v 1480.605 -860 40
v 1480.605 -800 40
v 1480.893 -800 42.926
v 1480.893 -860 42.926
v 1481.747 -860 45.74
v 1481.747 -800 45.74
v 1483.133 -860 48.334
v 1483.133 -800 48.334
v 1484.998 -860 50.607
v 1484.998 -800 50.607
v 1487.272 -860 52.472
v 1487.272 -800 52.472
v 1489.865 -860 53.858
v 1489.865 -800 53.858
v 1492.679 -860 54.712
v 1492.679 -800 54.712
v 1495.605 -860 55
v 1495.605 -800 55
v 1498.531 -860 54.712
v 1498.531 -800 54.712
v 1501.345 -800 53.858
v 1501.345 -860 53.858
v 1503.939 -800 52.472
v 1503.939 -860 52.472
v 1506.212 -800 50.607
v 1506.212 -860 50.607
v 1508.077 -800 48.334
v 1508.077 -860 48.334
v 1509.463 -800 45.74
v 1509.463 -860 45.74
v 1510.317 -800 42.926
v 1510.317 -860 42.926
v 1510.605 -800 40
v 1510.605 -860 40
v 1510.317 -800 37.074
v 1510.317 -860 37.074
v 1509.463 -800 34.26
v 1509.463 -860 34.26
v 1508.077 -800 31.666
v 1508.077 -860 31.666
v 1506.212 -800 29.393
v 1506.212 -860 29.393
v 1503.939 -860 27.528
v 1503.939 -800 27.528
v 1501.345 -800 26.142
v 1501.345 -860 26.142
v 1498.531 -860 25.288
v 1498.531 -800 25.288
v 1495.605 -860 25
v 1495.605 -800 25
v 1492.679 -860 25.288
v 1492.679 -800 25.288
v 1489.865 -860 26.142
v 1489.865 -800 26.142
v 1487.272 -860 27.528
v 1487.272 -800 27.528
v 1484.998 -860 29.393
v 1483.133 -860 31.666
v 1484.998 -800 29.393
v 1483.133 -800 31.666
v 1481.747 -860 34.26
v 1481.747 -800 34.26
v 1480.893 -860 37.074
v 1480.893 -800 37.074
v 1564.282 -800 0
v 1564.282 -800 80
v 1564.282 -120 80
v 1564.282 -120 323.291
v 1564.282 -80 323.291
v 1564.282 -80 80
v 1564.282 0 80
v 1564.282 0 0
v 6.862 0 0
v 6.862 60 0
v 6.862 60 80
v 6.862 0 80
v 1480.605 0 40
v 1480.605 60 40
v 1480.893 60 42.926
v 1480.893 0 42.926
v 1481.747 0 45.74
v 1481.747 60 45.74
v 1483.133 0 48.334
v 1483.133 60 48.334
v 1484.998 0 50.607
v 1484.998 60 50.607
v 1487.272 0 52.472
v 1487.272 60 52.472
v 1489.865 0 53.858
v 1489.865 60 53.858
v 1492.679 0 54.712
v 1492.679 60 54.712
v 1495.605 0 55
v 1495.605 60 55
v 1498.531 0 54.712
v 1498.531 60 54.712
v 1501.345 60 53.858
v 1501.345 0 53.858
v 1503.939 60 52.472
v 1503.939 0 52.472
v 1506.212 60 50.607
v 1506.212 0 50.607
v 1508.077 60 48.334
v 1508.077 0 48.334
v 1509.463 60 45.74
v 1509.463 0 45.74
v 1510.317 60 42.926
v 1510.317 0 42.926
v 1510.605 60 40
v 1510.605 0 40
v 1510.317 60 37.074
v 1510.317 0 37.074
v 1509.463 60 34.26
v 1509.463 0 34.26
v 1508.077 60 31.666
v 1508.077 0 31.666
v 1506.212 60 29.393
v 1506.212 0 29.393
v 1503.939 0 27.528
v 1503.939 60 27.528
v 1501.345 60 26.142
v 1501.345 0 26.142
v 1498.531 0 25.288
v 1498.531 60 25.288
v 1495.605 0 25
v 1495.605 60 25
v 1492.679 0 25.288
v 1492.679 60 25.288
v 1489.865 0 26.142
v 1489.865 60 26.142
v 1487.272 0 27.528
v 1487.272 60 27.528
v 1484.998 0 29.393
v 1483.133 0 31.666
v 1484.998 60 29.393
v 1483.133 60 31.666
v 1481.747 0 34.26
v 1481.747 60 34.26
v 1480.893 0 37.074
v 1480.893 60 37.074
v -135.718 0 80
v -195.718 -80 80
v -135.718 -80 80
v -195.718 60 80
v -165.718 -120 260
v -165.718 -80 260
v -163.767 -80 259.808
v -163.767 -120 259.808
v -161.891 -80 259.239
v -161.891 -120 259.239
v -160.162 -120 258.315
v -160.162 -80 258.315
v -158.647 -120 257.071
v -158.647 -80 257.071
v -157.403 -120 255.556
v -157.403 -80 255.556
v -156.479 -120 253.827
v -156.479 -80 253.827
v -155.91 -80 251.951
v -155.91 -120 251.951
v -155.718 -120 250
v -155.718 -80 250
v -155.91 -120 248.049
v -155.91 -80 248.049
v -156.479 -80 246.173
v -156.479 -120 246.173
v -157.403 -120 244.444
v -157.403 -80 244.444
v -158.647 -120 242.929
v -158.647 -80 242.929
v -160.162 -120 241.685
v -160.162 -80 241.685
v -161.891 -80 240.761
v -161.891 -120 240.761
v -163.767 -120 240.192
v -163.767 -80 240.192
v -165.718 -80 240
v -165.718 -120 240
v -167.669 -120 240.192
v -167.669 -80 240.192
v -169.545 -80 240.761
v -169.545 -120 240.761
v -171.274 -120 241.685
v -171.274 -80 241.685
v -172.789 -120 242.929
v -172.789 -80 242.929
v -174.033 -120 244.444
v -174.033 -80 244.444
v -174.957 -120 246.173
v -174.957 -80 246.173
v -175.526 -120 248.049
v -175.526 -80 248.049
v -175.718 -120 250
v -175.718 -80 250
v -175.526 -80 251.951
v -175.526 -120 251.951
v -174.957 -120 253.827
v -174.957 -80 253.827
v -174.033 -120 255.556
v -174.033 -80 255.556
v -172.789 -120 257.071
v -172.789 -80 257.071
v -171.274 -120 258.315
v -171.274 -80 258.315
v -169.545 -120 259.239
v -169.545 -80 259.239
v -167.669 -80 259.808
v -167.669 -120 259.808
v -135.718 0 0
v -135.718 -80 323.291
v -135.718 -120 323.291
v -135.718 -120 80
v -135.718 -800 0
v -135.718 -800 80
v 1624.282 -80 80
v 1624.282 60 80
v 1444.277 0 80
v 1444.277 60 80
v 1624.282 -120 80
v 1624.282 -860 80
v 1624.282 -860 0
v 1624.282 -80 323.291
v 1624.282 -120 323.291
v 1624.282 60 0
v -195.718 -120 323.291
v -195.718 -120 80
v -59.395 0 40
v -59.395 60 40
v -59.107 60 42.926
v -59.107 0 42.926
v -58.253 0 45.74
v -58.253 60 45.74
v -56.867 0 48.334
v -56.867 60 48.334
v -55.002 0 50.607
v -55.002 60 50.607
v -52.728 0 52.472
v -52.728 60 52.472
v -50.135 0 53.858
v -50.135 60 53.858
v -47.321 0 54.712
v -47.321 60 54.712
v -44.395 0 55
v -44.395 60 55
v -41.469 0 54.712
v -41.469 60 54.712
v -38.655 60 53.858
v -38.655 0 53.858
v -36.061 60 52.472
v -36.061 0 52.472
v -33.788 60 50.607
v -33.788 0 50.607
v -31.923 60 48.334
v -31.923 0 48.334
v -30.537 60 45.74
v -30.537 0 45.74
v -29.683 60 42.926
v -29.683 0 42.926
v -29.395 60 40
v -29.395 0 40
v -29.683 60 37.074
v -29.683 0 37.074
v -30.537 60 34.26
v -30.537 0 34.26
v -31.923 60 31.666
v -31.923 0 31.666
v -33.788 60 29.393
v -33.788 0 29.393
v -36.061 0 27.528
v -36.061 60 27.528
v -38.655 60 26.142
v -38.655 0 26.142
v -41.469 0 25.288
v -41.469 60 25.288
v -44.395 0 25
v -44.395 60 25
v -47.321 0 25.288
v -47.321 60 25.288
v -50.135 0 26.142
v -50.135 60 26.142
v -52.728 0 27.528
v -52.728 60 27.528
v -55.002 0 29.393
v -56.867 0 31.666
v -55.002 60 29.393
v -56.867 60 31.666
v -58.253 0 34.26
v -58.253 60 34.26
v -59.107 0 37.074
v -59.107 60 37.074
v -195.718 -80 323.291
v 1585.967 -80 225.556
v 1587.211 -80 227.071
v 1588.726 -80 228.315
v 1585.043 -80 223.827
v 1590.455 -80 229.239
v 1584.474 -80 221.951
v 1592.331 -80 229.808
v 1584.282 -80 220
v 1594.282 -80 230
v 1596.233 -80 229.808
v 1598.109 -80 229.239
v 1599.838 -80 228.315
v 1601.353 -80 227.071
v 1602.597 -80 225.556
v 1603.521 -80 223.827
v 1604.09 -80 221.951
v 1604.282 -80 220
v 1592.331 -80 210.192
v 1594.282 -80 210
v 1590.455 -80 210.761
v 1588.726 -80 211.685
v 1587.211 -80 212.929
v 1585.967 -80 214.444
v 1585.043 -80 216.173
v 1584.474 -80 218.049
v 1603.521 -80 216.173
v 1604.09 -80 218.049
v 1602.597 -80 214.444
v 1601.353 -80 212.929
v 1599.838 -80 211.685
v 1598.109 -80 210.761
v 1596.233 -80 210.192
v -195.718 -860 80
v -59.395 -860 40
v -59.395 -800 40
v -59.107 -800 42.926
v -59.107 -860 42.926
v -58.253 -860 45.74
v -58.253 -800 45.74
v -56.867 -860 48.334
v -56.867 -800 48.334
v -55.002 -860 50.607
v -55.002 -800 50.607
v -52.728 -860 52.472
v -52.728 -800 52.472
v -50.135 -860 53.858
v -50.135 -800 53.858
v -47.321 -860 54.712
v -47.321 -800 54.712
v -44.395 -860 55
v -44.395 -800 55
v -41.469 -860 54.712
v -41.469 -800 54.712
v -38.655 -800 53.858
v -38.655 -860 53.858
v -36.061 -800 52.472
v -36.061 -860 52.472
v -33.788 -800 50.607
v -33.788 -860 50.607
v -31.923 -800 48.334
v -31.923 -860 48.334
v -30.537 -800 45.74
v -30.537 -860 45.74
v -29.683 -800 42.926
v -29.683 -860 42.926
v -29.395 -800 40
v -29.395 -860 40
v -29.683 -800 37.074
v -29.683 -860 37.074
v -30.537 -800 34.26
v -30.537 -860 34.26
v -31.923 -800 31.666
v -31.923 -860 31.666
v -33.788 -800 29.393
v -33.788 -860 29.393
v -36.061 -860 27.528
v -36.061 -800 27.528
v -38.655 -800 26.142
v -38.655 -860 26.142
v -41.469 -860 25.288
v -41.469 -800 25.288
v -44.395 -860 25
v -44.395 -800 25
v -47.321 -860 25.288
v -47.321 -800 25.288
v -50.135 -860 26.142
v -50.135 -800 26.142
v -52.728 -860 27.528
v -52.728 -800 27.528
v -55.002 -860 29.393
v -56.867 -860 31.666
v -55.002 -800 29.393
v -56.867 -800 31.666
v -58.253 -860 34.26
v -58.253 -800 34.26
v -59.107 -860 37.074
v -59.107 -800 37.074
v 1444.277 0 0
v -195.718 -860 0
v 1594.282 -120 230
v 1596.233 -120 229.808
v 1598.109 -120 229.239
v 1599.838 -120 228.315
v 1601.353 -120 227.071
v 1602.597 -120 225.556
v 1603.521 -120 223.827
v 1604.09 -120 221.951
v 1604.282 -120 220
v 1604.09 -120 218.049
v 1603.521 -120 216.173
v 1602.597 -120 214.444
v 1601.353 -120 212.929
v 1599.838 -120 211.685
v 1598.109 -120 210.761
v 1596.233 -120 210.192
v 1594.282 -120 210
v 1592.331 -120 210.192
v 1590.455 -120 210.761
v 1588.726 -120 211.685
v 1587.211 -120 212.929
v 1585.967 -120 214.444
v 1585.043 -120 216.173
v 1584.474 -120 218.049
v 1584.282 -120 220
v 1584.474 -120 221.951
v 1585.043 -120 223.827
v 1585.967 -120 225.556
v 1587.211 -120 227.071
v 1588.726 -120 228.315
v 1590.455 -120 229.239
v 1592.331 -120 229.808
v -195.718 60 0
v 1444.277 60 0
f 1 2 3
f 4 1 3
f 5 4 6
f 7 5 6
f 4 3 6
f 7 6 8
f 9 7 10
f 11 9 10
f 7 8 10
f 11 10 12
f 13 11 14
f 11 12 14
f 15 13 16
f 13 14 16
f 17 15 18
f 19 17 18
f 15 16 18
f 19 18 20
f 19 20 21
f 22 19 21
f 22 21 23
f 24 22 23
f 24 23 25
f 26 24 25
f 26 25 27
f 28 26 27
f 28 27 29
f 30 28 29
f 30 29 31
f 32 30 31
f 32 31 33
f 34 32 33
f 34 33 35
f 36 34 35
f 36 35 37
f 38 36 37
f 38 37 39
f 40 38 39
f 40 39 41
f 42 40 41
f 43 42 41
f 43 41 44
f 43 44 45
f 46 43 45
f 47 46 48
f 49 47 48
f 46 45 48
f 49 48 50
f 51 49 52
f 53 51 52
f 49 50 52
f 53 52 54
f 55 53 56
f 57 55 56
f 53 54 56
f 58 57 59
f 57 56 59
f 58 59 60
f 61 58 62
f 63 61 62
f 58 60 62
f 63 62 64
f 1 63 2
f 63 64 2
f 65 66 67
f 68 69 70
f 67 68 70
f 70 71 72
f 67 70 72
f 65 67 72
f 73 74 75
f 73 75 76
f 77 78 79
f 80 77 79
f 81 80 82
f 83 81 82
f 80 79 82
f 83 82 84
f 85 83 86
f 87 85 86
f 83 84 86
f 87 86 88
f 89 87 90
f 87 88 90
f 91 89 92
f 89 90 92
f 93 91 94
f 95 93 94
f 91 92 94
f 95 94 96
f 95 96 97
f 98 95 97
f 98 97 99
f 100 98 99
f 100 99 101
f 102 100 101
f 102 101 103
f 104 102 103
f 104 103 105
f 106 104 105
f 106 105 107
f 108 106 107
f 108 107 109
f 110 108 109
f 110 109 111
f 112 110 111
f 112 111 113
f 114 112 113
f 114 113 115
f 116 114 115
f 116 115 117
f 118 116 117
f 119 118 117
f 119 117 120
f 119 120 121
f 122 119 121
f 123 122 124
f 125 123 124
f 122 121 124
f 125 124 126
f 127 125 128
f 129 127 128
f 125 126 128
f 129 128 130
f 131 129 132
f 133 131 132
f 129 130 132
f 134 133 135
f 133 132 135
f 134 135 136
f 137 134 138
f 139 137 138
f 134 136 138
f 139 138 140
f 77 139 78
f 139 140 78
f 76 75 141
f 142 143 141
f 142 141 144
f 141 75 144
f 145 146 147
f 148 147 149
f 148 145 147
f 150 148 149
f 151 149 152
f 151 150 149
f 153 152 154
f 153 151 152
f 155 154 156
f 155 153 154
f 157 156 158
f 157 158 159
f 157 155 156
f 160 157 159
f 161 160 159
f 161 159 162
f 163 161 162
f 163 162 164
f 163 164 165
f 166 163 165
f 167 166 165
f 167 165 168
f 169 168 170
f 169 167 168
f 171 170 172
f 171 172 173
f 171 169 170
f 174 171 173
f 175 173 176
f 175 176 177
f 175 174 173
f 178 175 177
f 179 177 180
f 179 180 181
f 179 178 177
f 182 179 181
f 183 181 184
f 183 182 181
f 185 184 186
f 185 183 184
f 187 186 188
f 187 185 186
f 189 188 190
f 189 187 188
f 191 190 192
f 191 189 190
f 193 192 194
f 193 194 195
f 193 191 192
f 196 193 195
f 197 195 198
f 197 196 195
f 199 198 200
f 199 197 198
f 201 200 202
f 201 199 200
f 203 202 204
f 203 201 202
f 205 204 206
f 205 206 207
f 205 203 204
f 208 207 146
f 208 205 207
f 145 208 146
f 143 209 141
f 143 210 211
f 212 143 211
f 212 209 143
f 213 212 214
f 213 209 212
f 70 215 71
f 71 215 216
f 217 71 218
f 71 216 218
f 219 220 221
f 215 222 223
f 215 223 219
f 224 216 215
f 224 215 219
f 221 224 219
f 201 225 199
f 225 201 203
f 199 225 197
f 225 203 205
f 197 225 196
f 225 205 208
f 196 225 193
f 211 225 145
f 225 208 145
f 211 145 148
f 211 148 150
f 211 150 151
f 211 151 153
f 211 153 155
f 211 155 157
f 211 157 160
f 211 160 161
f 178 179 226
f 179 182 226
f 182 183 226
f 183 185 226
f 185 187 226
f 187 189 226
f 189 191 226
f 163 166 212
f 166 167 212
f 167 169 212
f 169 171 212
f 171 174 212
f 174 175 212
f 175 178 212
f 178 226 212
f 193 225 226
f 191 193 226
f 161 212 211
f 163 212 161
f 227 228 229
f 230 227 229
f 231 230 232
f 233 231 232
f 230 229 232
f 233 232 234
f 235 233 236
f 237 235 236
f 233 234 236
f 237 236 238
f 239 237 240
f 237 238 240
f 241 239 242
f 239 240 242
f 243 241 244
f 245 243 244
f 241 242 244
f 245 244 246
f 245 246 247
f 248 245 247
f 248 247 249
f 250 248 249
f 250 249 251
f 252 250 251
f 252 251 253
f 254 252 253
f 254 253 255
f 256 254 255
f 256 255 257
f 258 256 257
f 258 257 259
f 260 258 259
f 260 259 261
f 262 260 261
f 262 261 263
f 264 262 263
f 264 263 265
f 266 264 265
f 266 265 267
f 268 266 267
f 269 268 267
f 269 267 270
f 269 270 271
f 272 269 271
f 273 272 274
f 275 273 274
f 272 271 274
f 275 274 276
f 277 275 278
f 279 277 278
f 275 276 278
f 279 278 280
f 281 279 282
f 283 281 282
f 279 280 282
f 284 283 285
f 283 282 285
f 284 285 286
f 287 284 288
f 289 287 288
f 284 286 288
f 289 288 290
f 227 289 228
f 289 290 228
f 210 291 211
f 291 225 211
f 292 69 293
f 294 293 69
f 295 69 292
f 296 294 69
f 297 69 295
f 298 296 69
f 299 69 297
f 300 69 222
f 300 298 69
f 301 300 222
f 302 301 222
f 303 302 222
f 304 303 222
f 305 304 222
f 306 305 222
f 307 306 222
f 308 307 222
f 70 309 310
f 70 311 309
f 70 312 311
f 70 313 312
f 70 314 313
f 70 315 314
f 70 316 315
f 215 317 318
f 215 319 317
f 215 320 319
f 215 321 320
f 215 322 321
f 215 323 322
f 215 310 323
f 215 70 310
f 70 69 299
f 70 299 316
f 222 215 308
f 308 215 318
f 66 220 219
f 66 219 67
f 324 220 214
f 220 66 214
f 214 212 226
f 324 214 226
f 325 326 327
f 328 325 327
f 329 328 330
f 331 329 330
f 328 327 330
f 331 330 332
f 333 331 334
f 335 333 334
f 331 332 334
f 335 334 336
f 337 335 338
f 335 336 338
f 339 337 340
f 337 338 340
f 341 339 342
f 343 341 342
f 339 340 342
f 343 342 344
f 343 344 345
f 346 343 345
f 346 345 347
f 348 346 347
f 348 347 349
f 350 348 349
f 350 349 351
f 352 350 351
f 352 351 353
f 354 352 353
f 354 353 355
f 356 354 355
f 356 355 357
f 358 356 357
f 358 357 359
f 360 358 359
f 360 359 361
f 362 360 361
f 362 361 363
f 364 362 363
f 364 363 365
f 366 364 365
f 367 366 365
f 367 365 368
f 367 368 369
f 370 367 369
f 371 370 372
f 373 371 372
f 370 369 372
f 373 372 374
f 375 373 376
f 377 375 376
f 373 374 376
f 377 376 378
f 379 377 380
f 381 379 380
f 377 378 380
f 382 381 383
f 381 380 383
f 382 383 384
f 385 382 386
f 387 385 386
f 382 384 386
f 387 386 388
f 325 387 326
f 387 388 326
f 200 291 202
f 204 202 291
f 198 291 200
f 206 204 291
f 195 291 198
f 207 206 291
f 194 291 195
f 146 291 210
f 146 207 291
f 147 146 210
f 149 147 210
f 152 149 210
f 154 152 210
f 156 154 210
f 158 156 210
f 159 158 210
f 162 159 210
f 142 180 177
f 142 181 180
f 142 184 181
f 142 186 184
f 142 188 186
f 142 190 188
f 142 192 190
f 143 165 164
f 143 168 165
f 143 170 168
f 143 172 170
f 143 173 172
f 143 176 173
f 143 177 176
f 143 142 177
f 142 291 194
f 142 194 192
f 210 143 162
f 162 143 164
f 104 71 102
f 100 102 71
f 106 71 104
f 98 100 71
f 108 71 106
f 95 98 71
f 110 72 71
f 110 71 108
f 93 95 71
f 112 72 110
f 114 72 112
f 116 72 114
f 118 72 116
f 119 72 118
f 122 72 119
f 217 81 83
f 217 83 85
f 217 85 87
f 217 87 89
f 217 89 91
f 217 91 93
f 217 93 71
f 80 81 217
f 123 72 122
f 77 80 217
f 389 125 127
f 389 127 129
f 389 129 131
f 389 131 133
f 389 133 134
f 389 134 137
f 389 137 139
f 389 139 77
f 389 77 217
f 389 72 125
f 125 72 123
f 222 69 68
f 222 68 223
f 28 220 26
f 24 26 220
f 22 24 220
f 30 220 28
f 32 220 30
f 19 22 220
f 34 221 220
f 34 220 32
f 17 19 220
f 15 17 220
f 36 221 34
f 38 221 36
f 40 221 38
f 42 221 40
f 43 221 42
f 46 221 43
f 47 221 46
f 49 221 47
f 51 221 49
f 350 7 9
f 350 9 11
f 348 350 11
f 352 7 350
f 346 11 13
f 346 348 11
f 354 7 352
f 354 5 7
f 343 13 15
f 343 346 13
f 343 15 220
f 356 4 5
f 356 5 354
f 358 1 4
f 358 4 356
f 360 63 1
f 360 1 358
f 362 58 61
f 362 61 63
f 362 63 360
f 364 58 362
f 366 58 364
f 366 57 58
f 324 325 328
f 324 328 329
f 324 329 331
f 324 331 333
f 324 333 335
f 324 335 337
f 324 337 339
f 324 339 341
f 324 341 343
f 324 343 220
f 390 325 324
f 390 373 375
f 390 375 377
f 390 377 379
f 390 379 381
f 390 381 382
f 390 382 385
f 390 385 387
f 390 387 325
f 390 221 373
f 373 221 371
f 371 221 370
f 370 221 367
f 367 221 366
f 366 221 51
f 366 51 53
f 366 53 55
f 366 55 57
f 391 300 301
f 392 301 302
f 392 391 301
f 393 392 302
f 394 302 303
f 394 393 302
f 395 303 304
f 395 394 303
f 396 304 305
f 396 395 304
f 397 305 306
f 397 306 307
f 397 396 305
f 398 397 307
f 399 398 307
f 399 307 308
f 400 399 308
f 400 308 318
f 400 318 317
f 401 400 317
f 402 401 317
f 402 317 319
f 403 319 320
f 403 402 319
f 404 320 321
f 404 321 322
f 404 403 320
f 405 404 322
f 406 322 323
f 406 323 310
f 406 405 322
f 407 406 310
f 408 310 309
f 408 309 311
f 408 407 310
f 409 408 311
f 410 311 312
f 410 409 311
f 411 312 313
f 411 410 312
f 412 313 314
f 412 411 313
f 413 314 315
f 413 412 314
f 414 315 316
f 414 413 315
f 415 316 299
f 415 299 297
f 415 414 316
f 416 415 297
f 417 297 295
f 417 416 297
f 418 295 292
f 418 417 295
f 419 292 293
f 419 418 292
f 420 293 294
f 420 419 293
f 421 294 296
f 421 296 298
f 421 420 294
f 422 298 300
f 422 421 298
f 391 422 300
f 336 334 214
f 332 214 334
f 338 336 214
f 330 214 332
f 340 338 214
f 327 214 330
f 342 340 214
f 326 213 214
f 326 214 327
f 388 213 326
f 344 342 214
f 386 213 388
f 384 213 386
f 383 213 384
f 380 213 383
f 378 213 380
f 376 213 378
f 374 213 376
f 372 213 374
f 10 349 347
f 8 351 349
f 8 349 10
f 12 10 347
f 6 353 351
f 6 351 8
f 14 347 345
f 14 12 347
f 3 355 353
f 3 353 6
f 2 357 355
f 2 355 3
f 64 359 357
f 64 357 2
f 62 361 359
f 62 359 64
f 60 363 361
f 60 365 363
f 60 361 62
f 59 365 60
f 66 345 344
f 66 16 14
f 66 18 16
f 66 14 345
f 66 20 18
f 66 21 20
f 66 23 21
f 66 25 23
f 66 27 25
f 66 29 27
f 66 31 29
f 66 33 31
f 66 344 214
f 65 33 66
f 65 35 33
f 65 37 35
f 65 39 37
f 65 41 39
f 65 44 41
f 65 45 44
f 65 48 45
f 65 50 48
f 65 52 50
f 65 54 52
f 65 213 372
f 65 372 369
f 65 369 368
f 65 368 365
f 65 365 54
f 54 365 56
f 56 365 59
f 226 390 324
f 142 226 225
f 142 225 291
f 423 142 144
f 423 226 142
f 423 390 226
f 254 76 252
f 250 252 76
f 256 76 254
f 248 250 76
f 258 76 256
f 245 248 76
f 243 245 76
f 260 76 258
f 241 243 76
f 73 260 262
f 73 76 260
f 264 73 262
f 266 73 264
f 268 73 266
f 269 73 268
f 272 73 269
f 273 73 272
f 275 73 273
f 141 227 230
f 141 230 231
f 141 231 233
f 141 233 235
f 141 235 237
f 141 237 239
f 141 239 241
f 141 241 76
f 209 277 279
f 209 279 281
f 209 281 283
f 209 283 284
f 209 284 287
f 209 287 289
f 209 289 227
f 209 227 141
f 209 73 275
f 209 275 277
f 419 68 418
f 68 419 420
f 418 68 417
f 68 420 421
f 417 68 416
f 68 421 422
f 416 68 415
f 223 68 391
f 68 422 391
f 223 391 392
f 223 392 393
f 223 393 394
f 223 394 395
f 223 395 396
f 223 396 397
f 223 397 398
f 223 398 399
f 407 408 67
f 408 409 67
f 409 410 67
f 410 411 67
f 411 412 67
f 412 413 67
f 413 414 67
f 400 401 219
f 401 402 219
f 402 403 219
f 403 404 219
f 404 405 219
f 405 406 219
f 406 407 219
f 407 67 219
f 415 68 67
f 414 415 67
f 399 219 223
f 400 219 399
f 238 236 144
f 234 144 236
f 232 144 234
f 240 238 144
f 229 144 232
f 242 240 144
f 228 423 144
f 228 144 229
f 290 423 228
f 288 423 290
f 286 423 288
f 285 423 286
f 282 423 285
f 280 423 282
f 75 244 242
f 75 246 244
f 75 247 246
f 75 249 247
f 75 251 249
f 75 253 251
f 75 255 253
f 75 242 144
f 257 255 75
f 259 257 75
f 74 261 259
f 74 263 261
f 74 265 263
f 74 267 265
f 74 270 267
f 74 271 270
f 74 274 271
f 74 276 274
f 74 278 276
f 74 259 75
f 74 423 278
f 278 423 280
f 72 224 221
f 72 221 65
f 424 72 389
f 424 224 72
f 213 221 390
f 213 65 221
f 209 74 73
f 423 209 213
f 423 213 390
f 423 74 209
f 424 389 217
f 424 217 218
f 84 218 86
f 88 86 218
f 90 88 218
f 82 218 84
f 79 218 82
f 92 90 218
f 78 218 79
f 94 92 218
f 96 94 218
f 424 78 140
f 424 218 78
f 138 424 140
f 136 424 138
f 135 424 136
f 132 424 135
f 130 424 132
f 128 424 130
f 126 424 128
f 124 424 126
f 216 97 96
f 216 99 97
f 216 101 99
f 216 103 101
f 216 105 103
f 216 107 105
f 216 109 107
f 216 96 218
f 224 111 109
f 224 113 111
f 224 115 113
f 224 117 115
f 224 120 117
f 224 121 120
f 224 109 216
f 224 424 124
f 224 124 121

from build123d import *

# Parameters (mm, degrees)
BOSS_EXTRU_1_DEPTH      = 80
ESQUISSE2_R             = 15
ENL_V_MAT_EXTRU_1_DEPTH = 1869.446312251
ESQUISSE3_W             = 60
ESQUISSE3_H             = 283.290811992
ESQUISSE3_R             = 10
BOSS_EXTRU_2_DEPTH      = 20


with BuildPart() as part:
    # Esquisse1 → Boss.-Extru.1 (new body)
    with BuildSketch(Plane.XY):
        Polygon((6.862464031, 0), (-135.71812121, 0), (-135.71812121, -800), (1564.28187879, -800), (1564.28187879, 0), (1444.276814416, 0), (1444.276814416, 60), (1624.28187879, 60), (1624.28187879, -860), (-195.71812121, -860), (-195.71812121, 60), (6.862464031, 60), align=None)
    extrude(amount=BOSS_EXTRU_1_DEPTH)

    # Esquisse2 → Enlèv. mat.-Extru.1 (cut, through all)
    with BuildSketch(Plane(origin=(0, 60, 0), x_dir=(1, 0, 0), z_dir=(0, 1, 0))):
        with Locations(Location((-44.394941641, -40, 0), (0, 0, 180))):
            Circle(ESQUISSE2_R)
        with Locations(Location((1495.605058359, -40, 0), (0, 0, 180))):
            Circle(ESQUISSE2_R)
    extrude(amount=-ENL_V_MAT_EXTRU_1_DEPTH, mode=Mode.SUBTRACT)

    # Esquisse3 → Boss.-Extru.2 (add, symmetric)
    # profile 1 of 2: a face of its own
    with BuildSketch(Plane(origin=(0, -100, 0), x_dir=(1, 0, 0), z_dir=(0, 1, 0))):
        with Locations((-165.71812121, -181.645405996)):
            Rectangle(ESQUISSE3_W, ESQUISSE3_H)
        with Locations(Location((-165.71812121, -250, 0), (0, 0, 270))):
            Circle(ESQUISSE3_R, mode=Mode.SUBTRACT)
    # profile 2 of 2: a face of its own
    with BuildSketch(Plane(origin=(0, -100, 0), x_dir=(1, 0, 0), z_dir=(0, 1, 0))):
        with Locations((1594.28187879, -181.645405996)):
            Rectangle(ESQUISSE3_W, ESQUISSE3_H)
        with Locations(Location((1594.28187879, -220, 0), (0, 0, 270))):
            Circle(ESQUISSE3_R, mode=Mode.SUBTRACT)
    extrude(amount=BOSS_EXTRU_2_DEPTH, both=True)


solid = part.part
